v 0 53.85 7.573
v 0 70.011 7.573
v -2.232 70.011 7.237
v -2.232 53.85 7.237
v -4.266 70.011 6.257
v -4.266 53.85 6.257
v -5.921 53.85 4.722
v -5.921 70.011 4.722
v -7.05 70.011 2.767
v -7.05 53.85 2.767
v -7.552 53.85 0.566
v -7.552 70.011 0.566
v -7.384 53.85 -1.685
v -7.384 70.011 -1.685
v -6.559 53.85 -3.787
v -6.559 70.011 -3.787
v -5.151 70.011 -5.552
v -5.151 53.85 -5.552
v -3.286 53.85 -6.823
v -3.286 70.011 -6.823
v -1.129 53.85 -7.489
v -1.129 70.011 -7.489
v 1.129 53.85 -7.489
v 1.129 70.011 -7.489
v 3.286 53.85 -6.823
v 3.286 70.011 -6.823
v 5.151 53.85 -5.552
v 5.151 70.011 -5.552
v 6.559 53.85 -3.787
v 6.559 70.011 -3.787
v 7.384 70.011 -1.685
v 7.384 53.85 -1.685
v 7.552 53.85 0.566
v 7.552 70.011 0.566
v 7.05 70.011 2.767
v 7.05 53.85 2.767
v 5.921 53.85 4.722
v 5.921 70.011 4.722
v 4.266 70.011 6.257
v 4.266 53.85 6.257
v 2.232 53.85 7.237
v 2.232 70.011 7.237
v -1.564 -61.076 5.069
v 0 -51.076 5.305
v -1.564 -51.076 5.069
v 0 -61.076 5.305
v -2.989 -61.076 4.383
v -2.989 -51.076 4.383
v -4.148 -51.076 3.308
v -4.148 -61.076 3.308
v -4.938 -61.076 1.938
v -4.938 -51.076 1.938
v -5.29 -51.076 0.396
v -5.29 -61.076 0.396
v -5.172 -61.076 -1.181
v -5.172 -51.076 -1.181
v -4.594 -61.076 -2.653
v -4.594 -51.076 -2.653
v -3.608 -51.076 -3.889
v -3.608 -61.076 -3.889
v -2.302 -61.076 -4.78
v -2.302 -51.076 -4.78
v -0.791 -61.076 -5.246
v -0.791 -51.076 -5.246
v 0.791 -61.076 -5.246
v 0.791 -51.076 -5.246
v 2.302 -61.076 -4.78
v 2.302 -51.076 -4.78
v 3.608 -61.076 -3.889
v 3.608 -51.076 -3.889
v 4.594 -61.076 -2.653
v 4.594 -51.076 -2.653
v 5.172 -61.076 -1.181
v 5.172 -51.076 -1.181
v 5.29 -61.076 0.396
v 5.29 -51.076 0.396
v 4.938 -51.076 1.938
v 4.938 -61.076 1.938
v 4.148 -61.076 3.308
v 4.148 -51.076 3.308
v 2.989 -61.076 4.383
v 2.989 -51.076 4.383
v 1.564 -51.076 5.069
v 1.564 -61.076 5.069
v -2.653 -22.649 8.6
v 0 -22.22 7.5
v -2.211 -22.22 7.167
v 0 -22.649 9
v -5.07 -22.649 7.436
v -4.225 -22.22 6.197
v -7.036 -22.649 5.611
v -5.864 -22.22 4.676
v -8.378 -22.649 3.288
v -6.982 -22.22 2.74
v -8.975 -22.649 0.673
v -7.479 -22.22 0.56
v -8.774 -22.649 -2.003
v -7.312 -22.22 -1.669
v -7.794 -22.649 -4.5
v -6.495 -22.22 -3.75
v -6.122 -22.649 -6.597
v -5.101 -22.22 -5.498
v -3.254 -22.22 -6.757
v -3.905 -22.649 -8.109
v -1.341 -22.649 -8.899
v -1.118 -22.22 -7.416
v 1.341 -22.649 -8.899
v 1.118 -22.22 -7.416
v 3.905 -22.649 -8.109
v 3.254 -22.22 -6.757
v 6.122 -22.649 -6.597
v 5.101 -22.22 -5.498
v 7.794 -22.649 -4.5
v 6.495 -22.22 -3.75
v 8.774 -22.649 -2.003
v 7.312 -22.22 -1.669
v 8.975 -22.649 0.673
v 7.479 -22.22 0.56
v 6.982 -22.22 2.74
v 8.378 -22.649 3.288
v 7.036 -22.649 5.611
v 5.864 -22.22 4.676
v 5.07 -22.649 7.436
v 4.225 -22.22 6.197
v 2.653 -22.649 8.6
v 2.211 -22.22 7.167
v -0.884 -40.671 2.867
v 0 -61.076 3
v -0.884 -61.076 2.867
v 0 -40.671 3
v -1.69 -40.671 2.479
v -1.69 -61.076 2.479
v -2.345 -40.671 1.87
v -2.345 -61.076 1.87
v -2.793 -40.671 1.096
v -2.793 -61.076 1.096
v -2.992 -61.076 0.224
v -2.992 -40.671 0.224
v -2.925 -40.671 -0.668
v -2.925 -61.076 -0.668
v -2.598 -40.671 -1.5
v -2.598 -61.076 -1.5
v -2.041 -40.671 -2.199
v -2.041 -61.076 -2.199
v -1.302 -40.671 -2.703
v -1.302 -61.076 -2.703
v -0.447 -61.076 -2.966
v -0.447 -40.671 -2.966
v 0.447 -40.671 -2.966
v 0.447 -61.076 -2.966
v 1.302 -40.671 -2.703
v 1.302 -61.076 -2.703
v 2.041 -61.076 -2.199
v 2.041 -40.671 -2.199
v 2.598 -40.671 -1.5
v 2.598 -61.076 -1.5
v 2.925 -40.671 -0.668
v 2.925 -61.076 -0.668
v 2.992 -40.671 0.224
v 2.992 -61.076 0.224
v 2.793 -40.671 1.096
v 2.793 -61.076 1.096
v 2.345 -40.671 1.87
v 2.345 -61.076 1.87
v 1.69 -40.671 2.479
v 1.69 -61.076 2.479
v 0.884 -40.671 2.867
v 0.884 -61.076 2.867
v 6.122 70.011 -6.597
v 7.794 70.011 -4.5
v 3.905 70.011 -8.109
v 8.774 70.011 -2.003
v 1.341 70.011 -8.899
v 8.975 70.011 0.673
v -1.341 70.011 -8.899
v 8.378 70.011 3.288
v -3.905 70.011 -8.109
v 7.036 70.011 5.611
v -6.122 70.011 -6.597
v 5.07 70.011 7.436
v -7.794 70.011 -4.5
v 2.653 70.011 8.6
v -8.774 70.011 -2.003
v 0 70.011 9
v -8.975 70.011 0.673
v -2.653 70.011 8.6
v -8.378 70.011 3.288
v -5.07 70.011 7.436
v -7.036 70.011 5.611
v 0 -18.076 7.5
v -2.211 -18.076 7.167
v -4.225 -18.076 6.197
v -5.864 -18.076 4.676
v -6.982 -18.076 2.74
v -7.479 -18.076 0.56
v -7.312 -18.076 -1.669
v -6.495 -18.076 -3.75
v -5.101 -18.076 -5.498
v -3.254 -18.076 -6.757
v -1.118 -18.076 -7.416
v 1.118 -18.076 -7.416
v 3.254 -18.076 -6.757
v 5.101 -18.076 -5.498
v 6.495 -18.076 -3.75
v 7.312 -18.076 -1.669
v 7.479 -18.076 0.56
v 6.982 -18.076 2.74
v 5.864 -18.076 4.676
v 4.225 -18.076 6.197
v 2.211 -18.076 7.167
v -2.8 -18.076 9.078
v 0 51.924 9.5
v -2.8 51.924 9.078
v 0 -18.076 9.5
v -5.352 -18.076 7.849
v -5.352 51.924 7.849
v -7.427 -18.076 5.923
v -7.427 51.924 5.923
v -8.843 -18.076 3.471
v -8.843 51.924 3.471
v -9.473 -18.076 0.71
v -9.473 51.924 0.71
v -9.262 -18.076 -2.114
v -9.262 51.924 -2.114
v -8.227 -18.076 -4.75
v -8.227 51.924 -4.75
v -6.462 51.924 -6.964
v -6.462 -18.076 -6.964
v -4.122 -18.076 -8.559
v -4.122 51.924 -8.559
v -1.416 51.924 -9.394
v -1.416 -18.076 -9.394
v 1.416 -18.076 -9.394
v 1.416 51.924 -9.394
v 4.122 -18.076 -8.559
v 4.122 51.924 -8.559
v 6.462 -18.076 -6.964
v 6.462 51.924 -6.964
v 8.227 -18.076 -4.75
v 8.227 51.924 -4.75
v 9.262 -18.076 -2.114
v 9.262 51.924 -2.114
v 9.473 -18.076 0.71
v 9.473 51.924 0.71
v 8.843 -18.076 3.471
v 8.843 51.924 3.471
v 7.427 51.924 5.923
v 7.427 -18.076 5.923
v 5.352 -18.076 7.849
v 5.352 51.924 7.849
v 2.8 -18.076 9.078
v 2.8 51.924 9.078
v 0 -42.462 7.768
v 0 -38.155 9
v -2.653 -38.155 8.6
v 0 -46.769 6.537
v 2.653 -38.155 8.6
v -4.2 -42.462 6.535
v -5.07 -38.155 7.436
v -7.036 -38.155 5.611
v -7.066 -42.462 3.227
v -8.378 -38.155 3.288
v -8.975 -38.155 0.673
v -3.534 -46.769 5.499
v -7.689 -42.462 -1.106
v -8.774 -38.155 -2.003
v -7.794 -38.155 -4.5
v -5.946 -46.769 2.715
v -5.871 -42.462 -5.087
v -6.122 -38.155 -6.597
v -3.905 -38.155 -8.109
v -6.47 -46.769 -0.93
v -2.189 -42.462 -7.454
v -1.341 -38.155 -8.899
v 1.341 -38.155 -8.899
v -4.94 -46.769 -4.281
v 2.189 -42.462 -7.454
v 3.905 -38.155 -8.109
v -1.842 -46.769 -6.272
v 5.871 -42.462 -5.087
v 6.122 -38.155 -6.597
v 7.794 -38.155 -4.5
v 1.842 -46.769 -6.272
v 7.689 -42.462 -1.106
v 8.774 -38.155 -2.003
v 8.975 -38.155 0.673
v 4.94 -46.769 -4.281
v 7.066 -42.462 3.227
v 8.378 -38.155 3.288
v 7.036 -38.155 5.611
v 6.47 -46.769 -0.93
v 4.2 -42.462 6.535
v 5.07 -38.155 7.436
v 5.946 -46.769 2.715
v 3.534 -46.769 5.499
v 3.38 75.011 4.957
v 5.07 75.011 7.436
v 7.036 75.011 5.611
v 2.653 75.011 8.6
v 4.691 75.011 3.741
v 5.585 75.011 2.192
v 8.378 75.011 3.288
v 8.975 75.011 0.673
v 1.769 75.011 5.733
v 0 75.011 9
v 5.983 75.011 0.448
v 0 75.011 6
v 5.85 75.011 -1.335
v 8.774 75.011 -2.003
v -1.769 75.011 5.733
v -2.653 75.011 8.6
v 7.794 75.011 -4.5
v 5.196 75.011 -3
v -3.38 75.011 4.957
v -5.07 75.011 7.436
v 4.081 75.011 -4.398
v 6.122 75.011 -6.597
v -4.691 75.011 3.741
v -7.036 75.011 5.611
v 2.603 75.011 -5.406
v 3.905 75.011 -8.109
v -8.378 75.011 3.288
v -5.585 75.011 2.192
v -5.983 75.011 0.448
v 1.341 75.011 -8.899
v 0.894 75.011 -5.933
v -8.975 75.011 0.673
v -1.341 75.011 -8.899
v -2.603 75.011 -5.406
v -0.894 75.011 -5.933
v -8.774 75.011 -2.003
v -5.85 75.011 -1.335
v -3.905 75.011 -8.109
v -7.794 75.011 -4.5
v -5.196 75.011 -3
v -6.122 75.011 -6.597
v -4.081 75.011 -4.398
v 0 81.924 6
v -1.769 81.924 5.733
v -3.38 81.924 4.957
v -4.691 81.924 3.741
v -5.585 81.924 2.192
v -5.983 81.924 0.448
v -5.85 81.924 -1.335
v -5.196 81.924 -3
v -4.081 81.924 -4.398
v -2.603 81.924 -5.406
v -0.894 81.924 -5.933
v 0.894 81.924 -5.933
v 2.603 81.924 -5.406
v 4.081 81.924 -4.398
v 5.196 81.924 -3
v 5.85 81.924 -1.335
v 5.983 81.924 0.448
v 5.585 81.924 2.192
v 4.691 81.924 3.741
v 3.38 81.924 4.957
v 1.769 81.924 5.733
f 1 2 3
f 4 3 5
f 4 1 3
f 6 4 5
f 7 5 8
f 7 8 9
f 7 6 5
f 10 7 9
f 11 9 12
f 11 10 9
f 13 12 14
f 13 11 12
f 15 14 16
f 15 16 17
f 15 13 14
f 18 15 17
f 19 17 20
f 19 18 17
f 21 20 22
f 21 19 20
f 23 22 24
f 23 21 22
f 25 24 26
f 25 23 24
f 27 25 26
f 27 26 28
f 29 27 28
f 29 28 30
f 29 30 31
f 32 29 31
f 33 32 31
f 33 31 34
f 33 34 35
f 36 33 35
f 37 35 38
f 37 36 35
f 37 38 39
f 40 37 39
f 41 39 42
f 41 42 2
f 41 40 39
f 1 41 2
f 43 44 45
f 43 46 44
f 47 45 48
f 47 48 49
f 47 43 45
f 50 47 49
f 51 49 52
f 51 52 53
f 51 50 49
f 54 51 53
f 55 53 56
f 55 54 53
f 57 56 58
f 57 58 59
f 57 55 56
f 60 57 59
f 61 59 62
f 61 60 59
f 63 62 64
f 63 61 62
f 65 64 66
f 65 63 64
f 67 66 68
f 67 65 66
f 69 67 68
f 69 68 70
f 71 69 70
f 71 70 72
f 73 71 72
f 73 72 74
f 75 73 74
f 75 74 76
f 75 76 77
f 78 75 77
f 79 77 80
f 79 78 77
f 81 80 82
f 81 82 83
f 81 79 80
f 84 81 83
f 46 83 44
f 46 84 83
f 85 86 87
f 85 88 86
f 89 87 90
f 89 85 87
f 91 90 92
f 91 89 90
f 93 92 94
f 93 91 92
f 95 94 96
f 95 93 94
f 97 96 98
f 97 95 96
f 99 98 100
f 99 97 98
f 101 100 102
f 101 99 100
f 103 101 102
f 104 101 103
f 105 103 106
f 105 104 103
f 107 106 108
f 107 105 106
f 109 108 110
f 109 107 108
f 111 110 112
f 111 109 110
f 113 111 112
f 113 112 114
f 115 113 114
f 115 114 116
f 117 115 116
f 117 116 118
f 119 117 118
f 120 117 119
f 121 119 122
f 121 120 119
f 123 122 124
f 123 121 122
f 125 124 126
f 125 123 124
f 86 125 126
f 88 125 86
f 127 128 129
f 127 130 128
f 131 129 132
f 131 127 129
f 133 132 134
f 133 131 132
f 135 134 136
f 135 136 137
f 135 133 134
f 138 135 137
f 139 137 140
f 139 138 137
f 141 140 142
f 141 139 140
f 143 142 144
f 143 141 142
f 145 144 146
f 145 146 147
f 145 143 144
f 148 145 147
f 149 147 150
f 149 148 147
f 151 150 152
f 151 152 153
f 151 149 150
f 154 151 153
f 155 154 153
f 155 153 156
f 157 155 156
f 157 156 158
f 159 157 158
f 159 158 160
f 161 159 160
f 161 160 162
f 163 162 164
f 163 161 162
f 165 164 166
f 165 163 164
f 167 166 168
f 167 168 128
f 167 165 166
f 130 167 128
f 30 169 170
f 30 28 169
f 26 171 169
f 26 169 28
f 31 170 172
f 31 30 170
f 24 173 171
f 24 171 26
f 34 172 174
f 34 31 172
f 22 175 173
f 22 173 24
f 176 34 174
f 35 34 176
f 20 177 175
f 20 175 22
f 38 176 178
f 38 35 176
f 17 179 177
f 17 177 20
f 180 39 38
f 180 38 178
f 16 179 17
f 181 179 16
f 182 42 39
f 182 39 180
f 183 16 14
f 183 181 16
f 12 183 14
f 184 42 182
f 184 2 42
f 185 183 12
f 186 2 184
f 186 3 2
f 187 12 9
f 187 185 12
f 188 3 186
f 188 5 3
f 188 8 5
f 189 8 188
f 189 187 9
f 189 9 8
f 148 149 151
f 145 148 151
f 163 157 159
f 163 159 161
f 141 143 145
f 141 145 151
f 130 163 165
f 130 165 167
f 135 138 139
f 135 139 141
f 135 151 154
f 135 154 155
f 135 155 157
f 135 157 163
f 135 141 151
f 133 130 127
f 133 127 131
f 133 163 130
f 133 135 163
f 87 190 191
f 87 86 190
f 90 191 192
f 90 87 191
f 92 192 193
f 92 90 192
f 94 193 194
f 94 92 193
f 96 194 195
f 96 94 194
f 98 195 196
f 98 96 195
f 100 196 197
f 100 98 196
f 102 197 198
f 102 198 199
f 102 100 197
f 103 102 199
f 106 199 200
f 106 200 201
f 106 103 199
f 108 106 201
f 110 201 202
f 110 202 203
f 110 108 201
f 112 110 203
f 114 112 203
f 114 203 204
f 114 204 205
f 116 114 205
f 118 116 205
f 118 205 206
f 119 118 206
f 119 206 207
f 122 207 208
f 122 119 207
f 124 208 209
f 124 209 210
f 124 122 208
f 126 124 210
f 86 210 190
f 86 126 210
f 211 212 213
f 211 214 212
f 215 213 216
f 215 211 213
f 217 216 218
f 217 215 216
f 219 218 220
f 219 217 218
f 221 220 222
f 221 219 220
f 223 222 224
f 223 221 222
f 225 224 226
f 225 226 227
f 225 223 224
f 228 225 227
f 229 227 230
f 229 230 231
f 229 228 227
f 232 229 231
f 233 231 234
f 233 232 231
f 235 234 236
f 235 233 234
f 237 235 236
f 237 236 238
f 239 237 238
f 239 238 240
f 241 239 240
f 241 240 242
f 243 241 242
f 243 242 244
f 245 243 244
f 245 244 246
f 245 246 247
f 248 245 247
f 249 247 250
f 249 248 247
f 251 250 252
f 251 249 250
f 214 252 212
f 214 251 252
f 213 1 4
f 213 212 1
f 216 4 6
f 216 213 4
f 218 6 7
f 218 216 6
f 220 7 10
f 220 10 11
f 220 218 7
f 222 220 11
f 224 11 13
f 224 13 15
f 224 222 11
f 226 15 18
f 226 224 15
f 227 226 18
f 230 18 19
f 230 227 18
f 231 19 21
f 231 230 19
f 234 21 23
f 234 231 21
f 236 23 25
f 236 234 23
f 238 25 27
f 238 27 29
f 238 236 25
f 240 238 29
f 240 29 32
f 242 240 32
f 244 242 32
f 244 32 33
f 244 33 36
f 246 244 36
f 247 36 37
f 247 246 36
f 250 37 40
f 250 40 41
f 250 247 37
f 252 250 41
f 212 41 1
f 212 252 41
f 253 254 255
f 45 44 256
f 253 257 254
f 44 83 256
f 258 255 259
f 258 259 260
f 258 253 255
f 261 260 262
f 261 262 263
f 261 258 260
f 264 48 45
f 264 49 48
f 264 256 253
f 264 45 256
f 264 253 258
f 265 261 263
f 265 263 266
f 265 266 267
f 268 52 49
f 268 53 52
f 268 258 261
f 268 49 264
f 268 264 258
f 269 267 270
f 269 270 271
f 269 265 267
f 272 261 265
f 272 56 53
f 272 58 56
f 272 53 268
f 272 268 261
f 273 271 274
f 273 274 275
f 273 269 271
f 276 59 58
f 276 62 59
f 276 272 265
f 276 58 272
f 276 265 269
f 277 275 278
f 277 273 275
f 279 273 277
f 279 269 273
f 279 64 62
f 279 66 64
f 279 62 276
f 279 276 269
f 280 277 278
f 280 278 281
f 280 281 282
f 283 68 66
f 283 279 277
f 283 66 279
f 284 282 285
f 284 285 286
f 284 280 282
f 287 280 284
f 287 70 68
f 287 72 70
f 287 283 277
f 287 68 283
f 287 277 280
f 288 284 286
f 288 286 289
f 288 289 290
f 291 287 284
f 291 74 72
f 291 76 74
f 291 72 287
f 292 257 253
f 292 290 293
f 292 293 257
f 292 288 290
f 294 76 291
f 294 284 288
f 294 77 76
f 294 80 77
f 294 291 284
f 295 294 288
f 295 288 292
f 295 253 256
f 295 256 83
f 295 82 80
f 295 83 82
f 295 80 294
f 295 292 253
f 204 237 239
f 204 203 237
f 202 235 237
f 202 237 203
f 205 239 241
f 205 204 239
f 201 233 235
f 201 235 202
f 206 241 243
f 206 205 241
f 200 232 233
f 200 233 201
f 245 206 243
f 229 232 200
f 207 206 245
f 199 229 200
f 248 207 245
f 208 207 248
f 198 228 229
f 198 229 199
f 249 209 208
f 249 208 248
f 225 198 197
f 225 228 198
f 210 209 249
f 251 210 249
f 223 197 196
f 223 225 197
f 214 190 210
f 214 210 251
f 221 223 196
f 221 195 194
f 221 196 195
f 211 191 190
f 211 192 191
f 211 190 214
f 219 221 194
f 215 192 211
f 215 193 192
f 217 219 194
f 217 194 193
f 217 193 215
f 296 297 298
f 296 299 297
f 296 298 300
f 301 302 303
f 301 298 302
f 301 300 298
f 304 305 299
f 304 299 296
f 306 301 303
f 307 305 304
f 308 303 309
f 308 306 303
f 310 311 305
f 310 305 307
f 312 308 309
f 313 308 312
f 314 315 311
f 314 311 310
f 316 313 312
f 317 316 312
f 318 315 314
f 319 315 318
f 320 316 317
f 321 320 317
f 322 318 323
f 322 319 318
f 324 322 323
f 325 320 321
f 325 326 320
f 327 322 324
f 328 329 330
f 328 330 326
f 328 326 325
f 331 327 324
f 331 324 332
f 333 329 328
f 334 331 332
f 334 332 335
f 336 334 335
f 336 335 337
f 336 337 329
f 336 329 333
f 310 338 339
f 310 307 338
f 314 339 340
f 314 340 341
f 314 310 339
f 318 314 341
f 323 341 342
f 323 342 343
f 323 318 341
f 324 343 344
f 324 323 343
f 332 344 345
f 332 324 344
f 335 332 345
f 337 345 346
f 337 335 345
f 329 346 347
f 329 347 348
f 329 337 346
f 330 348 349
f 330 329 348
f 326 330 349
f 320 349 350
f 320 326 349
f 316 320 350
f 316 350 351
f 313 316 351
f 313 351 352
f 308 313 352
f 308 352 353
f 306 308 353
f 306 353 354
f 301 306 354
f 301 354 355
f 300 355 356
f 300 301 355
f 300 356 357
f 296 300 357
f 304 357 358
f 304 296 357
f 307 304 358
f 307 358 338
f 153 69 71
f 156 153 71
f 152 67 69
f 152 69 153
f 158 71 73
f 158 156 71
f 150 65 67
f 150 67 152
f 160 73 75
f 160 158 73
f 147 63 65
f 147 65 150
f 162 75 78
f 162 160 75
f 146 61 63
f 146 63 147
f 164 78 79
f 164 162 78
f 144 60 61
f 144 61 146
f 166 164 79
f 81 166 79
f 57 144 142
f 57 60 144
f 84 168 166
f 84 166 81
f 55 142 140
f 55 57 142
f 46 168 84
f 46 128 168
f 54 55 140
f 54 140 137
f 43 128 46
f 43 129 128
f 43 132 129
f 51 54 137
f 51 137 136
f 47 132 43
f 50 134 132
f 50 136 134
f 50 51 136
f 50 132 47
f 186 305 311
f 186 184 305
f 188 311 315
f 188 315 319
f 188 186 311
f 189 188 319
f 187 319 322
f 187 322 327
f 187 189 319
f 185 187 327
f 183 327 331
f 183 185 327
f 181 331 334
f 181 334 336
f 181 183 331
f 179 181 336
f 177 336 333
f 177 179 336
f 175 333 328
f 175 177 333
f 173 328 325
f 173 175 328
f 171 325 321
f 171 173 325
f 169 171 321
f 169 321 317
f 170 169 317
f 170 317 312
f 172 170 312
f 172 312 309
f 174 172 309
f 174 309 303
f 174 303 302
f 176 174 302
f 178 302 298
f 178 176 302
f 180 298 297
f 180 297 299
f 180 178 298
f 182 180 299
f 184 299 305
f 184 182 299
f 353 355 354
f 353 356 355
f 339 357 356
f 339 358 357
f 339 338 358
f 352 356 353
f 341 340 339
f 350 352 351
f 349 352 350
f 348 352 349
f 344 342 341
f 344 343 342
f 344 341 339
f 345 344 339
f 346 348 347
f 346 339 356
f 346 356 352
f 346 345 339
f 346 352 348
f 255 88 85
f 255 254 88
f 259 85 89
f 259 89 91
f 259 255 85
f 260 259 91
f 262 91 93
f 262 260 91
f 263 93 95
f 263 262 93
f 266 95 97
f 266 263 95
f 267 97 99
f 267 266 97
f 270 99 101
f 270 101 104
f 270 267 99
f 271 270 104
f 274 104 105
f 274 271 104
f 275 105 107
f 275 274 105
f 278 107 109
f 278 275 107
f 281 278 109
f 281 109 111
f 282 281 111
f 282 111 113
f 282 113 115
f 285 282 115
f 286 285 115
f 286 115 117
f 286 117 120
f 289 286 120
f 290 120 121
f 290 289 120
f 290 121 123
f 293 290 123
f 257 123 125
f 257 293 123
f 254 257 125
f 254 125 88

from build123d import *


with BuildPart() as part:
    # 草图1 → 旋转1 (revolve)
    with BuildSketch(Plane.XY, mode=Mode.PRIVATE) as revolve_1_sk:
        Polygon((0, 81.923883013), (6, 81.923883013), (6, 75.010759902), (9, 75.010759902), (9, 70.010759902), (7.57339192, 70.010759902), (7.57339192, 53.850491093), (9.5, 51.923883013), (9.5, -18.076116987), (0, -18.076116987), align=None)
    revolve(revolve_1_sk.sketch.rotate(Axis((0, 26.539226881, 0), (0, -1, 0)), 90), axis=Axis((0, 26.539226881, 0), (0, -1, 0)))

    # 草图2 → 旋转2 (revolve)
    with BuildSketch(Plane.XY, mode=Mode.PRIVATE) as revolve_2_sk:
        Polygon((7.5, -18.076116987), (7.5, -22.220066431), (9, -22.648998158), (9, -38.155089675), (5.305174294, -51.076116987), (5.305174294, -61.076116987), (3, -61.076116987), (3, -40.670715688), (0, -40.670715688), (0, -18.076116987), align=None)
    revolve(revolve_2_sk.sketch.rotate(Axis((0, -18.076116987, 0), (0, -1, 0)), 90), axis=Axis((0, -18.076116987, 0), (0, -1, 0)))


solid = part.part
